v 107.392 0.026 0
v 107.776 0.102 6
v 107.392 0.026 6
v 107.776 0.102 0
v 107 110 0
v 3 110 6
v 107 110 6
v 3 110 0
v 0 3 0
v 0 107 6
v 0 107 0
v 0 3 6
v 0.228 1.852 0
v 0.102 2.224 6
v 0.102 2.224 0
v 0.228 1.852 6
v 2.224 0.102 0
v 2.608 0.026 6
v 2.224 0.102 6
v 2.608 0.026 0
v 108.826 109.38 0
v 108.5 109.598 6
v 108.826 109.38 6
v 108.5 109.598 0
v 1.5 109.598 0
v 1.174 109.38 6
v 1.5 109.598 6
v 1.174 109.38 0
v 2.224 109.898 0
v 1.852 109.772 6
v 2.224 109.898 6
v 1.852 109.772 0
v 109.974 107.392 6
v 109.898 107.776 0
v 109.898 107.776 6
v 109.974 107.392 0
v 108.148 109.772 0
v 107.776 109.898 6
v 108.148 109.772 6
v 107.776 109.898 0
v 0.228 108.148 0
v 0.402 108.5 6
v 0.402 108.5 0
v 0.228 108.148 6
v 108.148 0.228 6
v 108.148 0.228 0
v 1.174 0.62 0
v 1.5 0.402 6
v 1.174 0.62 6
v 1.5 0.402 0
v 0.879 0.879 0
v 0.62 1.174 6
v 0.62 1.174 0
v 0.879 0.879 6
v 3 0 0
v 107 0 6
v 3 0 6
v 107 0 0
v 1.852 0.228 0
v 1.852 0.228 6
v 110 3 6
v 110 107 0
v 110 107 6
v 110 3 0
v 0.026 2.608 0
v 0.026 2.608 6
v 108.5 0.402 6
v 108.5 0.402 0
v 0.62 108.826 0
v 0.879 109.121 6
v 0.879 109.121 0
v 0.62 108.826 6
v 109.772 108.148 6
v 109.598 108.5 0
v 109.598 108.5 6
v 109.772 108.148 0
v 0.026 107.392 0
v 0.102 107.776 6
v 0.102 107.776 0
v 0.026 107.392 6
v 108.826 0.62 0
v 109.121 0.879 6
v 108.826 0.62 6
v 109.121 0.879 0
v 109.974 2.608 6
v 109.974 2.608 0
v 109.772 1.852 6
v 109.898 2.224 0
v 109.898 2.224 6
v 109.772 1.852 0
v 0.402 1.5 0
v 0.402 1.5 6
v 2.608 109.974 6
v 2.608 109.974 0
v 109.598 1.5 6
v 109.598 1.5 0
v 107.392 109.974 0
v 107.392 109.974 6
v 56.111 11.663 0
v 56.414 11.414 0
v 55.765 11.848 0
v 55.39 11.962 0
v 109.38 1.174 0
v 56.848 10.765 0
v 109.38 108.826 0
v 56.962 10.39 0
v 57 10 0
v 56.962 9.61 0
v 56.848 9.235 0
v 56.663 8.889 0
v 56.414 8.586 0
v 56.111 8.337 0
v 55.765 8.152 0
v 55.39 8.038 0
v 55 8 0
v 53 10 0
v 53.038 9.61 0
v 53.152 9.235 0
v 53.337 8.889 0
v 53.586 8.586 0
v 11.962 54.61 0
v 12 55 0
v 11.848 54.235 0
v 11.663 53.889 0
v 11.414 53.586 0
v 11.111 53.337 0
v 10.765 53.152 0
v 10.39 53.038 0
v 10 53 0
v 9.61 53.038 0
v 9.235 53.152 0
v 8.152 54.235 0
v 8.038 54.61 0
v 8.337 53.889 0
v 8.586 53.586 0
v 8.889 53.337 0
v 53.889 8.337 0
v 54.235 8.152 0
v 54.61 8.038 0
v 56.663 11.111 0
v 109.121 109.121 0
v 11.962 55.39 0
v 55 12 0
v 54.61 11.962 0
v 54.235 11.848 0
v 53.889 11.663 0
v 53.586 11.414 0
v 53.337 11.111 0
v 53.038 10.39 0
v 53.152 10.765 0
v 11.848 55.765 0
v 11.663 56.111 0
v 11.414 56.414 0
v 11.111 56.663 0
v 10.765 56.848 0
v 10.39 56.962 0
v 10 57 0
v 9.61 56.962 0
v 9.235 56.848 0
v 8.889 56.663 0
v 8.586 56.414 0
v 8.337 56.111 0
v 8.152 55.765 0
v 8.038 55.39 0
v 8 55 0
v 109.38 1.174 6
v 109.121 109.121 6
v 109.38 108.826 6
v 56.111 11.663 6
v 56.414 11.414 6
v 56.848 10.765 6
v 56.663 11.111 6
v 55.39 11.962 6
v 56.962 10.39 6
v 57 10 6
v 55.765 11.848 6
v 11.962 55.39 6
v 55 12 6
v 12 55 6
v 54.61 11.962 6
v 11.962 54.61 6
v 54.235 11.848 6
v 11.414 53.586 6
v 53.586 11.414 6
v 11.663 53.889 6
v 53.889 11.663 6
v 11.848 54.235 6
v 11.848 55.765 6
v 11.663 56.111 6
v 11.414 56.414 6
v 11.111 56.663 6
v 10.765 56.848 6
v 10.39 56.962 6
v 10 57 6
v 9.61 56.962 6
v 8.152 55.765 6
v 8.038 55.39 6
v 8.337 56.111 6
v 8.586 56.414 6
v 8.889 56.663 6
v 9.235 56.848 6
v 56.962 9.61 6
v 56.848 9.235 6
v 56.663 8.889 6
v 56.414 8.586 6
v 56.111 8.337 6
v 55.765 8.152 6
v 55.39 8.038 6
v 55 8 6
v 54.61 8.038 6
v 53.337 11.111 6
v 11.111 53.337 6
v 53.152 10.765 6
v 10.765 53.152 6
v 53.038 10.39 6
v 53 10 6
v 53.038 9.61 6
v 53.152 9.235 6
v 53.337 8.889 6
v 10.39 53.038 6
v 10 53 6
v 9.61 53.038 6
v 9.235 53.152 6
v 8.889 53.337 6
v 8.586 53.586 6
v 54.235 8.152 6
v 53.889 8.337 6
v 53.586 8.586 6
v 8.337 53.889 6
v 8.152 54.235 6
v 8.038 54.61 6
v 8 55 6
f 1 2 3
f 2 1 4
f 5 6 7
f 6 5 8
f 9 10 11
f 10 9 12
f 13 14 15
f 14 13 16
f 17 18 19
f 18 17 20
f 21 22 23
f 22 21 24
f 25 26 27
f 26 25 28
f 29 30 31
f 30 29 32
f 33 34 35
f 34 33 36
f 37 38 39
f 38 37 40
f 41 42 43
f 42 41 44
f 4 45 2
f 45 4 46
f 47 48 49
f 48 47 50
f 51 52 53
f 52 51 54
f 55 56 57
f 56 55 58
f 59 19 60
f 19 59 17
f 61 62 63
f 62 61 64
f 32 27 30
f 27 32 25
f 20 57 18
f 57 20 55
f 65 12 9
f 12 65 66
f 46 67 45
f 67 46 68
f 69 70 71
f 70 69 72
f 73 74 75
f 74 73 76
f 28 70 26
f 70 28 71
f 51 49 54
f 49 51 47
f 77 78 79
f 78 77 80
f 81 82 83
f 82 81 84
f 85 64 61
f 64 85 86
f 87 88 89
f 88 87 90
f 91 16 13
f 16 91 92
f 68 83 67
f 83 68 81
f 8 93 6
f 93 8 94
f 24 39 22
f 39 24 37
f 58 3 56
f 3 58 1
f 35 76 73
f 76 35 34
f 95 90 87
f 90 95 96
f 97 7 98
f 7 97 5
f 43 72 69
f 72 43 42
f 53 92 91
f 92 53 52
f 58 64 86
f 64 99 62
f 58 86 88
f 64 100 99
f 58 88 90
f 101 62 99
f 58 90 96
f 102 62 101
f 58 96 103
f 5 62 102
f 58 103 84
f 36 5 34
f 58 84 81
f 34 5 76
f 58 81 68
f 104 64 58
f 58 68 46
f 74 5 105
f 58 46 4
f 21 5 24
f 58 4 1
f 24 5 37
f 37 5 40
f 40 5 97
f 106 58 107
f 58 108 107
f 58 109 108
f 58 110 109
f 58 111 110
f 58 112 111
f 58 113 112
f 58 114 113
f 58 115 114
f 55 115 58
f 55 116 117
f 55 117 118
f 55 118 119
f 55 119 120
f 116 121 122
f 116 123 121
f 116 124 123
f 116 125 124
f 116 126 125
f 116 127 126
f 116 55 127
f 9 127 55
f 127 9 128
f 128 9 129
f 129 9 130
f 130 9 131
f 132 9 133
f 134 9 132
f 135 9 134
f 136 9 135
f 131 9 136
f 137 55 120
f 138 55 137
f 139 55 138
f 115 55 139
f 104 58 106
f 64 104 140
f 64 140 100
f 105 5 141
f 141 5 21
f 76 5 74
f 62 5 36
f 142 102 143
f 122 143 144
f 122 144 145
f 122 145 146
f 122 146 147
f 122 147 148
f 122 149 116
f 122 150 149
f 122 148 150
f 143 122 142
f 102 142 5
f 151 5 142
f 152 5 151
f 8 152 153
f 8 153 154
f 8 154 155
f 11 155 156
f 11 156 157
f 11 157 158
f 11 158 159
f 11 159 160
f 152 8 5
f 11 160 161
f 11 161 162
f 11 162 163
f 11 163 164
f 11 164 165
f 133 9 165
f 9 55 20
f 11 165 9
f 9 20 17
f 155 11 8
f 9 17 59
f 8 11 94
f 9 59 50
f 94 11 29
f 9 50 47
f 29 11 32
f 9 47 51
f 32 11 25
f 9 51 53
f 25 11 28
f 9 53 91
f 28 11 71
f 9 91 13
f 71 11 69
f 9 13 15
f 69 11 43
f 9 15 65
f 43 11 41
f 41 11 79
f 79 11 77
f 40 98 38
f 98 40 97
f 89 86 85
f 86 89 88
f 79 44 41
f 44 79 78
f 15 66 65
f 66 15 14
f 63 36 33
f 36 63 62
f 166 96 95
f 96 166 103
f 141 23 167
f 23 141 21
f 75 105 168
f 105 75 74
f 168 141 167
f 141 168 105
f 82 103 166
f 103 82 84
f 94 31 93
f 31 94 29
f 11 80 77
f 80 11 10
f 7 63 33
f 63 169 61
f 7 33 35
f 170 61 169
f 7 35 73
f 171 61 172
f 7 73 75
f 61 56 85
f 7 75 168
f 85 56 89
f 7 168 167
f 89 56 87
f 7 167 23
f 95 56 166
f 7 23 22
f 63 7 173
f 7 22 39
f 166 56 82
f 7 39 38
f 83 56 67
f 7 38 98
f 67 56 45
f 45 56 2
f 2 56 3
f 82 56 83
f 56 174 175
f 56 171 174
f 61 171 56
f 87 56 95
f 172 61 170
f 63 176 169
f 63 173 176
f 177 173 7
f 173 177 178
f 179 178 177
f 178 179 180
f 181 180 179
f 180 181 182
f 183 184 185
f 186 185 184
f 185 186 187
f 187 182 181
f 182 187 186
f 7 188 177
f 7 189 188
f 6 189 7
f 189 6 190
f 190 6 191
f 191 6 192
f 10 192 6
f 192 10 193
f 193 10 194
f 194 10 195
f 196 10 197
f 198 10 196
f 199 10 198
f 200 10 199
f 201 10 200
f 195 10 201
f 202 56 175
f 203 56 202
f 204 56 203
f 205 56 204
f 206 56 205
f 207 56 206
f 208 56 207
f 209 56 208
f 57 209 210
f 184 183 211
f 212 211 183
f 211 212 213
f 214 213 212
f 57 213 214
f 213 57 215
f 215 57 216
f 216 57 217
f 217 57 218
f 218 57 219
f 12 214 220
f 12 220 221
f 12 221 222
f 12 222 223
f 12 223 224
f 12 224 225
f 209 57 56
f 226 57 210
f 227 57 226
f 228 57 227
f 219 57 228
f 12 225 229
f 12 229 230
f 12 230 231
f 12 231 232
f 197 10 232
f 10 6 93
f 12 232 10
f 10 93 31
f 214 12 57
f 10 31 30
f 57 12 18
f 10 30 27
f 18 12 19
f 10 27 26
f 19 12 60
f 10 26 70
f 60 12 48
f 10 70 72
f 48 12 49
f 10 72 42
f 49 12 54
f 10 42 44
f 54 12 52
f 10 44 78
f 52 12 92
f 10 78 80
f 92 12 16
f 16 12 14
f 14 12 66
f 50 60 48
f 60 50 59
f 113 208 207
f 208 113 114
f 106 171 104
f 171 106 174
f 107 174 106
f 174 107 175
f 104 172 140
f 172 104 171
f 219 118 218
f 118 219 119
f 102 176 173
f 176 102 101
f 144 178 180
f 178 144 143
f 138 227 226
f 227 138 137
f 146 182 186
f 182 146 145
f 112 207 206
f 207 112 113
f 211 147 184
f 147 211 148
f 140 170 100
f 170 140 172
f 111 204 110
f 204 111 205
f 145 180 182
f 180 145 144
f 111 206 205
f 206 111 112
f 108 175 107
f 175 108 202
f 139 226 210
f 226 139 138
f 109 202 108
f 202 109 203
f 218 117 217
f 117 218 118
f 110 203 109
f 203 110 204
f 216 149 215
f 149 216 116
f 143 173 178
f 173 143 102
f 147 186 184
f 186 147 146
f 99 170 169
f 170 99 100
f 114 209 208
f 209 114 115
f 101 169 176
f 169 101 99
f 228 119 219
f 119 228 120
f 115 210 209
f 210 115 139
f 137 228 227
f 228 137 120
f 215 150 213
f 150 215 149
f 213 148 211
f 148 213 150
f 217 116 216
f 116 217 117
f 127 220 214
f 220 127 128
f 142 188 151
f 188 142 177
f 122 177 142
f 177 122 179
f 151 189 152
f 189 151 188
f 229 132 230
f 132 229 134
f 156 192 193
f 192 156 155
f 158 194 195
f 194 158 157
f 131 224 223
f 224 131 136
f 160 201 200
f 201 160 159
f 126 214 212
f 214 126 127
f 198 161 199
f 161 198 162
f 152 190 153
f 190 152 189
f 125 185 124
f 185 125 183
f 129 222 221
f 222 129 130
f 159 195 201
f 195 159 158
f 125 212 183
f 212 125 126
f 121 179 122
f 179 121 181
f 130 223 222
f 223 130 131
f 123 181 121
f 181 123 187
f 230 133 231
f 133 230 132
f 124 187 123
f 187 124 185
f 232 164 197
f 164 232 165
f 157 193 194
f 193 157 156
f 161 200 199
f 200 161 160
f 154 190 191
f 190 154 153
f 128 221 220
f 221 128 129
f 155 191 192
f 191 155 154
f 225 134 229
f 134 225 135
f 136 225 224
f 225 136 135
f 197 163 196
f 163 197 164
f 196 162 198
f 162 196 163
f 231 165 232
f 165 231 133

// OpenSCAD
/*

Creator
*****************
Constantin Ganshin

Project name:
*****************
support_square_for_kitchen_plate_dryer

Description:
****************************************
A parametric square support design for kitchen plate dryer racks.
The square provides additional stability and support for plate drying racks.

Recommended to be printed in PETG or ABS for better durability and heat resistance.

*/

// Resolution variables for smoother curves
$fa = 1;
$fs = 0.4;

// Main dimension variables
side_length = 110;    // Length of each side
thickness = 6;       // Thickness of the square
corner_radius = 3;   // Radius for rounded corners
hole_diameter = 4;   // Diameter of mounting holes
hole_margin = 10;    // Distance from edges for mounting holes

module rounded_square_support() {
    difference() {
        // Main square body
        hull() {
            // Four corners
            for(x = [corner_radius, side_length - corner_radius]) {
                for(y = [corner_radius, side_length - corner_radius]) {
                    translate([x, y, 0])
                        cylinder(r=corner_radius, h=thickness);
                }
            }
        }
        
        // Mounting holes - in the middle of sides, 20mm from edge
        translate([side_length/2, hole_margin, -1])  // Bottom side
            cylinder(d=hole_diameter, h=thickness + 2);
        translate([hole_margin, side_length/2, -1])  // Left side
            cylinder(d=hole_diameter, h=thickness + 2);
    }
}

// Generate the support
rounded_square_support(); 
